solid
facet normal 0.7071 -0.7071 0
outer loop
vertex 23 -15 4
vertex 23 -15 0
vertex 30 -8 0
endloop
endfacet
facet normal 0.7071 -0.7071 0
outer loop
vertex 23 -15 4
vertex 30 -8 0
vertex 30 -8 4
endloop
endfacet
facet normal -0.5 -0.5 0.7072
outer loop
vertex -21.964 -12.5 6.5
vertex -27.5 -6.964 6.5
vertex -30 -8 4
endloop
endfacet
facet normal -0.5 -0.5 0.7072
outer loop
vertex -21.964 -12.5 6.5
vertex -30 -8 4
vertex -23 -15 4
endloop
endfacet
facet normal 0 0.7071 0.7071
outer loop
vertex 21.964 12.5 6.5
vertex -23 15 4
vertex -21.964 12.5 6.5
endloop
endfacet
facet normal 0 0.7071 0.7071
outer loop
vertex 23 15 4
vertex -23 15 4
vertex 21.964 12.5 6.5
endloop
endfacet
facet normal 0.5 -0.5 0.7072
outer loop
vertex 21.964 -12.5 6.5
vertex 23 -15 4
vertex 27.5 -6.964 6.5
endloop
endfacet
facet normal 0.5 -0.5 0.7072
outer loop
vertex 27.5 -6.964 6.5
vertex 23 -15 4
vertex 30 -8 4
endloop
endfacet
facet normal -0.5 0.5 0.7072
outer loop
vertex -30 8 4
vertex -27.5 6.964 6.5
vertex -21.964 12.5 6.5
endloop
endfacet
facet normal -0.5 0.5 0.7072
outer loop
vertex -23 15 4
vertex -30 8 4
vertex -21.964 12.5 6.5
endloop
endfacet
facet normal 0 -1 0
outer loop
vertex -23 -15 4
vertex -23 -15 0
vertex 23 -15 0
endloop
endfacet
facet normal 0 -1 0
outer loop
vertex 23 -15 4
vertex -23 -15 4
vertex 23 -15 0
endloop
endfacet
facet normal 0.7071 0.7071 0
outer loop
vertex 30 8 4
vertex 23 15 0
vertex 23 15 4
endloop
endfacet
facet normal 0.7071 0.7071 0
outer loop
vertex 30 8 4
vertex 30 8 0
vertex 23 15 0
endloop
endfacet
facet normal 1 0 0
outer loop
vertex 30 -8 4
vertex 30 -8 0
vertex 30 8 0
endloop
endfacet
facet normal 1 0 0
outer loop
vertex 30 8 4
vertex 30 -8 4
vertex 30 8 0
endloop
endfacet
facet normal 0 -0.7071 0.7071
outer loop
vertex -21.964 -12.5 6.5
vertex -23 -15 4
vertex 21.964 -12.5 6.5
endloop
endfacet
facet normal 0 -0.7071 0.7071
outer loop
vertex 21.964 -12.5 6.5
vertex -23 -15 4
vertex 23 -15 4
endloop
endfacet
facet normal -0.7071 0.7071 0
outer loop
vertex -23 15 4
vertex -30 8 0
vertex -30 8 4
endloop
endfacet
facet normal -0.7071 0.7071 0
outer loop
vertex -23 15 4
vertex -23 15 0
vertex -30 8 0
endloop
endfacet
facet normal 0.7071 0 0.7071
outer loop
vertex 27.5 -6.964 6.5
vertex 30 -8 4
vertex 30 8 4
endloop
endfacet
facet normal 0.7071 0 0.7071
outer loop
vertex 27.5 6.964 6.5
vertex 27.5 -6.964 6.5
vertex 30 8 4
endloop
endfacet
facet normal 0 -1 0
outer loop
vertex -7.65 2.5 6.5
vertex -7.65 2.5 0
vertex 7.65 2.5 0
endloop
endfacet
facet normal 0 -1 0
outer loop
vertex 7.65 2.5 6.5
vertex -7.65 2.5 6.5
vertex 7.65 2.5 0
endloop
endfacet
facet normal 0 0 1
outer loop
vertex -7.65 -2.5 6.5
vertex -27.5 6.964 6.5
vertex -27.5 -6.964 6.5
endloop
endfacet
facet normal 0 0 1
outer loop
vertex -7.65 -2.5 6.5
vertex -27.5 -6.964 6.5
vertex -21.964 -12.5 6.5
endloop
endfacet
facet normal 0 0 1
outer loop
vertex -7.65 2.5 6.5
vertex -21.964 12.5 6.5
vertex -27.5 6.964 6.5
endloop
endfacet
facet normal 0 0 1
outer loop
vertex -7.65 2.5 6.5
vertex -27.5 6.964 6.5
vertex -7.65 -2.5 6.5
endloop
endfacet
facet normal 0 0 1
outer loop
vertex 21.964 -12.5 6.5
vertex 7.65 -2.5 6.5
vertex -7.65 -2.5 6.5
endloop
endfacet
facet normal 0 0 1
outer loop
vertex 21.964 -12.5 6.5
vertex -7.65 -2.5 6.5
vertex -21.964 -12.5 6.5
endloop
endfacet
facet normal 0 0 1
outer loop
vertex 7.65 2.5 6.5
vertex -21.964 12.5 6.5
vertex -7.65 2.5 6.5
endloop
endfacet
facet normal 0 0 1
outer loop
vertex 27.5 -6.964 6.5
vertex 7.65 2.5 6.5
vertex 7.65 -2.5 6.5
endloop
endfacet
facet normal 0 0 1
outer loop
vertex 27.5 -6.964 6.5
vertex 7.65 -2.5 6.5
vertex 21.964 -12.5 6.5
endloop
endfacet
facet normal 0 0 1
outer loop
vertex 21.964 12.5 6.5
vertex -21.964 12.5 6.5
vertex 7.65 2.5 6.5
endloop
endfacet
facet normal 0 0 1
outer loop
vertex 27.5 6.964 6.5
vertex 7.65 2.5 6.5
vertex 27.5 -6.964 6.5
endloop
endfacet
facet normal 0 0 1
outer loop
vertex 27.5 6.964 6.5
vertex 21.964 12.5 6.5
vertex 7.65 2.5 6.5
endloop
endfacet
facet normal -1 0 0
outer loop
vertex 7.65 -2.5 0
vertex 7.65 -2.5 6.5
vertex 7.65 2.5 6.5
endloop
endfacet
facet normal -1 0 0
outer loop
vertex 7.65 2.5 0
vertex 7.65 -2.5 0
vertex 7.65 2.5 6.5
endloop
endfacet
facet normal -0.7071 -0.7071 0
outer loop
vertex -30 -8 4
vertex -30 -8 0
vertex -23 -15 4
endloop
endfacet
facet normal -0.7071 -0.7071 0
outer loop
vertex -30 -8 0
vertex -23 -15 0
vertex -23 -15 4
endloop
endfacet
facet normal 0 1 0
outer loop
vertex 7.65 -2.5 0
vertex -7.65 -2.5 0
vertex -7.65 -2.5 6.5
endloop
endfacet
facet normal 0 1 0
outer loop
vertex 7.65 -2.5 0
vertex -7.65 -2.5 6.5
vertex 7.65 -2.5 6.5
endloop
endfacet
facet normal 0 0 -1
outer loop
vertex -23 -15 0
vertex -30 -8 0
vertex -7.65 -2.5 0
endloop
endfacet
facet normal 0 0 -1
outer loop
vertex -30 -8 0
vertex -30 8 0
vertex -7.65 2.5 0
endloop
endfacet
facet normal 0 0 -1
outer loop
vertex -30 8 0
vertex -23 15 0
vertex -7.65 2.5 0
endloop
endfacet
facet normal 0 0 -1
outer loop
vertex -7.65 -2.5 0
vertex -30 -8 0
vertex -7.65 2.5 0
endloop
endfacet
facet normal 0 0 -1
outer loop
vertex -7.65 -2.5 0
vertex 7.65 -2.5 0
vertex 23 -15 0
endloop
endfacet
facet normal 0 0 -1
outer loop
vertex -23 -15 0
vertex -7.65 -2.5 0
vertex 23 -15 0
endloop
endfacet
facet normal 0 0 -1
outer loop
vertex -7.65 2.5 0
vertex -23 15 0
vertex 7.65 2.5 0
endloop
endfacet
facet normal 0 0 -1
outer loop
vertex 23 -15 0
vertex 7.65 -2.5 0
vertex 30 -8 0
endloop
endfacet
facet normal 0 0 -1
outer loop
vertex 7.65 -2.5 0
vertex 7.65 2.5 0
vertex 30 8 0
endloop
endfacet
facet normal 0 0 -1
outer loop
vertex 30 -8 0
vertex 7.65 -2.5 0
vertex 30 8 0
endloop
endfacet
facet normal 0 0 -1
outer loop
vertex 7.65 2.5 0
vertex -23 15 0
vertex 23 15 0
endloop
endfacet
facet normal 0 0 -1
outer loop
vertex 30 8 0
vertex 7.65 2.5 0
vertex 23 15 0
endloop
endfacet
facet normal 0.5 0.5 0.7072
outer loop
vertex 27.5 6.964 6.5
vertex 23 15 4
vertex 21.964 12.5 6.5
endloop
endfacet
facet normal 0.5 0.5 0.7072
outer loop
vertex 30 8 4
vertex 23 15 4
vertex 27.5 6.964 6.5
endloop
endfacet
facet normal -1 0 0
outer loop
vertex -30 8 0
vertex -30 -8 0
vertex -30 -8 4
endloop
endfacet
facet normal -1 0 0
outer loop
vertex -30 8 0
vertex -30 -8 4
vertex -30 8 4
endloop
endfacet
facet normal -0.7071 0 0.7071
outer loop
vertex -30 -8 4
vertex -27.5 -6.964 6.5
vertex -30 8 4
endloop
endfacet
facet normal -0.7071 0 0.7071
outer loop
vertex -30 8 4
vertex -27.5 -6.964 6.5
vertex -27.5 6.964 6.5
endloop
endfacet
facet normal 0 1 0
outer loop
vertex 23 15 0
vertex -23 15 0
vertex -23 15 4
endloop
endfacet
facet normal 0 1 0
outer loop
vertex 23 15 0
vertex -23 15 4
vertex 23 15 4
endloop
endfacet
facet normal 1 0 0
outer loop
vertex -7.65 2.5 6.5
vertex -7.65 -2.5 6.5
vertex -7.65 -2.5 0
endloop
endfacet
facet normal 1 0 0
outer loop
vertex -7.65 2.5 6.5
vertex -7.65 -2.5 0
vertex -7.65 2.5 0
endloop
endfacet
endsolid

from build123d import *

# Parameters (mm, degrees)
F0_W     = 60
F0_H     = 30
F0_W_2   = 15.3
F0_H_2   = 5
F1_DEPTH = 6.5
F2_SIZE  = 7
F3_SIZE  = 2.5


with BuildPart() as f1:
    # F0 (on Top) → F1 (new body)
    with BuildSketch(Plane.XY):
        Rectangle(F0_W, F0_H)
        Rectangle(F0_W_2, F0_H_2, mode=Mode.SUBTRACT)
    extrude(amount=F1_DEPTH)

    # F2
    f2_edges = [f1.edges().sort_by_distance(p)[0] for p in [
        (-30, -15, 3.25),
        (30, -15, 3.25),
        (30, 15, 3.25),
        (-30, 15, 3.25),
    ]]
    chamfer(f2_edges, length=F2_SIZE)

    # F3
    f3_edges = [f1.edges().sort_by_distance(p)[0] for p in [
        (0, 15, 6.5),
        (-26.5, 11.5, 6.5),
        (-30, 0, 6.5),
        (-26.5, -11.5, 6.5),
        (0, -15, 6.5),
        (26.5, -11.5, 6.5),
        (30, 0, 6.5),
        (26.5, 11.5, 6.5),
    ]]
    chamfer(f3_edges, length=F3_SIZE)


solid = f1.part
